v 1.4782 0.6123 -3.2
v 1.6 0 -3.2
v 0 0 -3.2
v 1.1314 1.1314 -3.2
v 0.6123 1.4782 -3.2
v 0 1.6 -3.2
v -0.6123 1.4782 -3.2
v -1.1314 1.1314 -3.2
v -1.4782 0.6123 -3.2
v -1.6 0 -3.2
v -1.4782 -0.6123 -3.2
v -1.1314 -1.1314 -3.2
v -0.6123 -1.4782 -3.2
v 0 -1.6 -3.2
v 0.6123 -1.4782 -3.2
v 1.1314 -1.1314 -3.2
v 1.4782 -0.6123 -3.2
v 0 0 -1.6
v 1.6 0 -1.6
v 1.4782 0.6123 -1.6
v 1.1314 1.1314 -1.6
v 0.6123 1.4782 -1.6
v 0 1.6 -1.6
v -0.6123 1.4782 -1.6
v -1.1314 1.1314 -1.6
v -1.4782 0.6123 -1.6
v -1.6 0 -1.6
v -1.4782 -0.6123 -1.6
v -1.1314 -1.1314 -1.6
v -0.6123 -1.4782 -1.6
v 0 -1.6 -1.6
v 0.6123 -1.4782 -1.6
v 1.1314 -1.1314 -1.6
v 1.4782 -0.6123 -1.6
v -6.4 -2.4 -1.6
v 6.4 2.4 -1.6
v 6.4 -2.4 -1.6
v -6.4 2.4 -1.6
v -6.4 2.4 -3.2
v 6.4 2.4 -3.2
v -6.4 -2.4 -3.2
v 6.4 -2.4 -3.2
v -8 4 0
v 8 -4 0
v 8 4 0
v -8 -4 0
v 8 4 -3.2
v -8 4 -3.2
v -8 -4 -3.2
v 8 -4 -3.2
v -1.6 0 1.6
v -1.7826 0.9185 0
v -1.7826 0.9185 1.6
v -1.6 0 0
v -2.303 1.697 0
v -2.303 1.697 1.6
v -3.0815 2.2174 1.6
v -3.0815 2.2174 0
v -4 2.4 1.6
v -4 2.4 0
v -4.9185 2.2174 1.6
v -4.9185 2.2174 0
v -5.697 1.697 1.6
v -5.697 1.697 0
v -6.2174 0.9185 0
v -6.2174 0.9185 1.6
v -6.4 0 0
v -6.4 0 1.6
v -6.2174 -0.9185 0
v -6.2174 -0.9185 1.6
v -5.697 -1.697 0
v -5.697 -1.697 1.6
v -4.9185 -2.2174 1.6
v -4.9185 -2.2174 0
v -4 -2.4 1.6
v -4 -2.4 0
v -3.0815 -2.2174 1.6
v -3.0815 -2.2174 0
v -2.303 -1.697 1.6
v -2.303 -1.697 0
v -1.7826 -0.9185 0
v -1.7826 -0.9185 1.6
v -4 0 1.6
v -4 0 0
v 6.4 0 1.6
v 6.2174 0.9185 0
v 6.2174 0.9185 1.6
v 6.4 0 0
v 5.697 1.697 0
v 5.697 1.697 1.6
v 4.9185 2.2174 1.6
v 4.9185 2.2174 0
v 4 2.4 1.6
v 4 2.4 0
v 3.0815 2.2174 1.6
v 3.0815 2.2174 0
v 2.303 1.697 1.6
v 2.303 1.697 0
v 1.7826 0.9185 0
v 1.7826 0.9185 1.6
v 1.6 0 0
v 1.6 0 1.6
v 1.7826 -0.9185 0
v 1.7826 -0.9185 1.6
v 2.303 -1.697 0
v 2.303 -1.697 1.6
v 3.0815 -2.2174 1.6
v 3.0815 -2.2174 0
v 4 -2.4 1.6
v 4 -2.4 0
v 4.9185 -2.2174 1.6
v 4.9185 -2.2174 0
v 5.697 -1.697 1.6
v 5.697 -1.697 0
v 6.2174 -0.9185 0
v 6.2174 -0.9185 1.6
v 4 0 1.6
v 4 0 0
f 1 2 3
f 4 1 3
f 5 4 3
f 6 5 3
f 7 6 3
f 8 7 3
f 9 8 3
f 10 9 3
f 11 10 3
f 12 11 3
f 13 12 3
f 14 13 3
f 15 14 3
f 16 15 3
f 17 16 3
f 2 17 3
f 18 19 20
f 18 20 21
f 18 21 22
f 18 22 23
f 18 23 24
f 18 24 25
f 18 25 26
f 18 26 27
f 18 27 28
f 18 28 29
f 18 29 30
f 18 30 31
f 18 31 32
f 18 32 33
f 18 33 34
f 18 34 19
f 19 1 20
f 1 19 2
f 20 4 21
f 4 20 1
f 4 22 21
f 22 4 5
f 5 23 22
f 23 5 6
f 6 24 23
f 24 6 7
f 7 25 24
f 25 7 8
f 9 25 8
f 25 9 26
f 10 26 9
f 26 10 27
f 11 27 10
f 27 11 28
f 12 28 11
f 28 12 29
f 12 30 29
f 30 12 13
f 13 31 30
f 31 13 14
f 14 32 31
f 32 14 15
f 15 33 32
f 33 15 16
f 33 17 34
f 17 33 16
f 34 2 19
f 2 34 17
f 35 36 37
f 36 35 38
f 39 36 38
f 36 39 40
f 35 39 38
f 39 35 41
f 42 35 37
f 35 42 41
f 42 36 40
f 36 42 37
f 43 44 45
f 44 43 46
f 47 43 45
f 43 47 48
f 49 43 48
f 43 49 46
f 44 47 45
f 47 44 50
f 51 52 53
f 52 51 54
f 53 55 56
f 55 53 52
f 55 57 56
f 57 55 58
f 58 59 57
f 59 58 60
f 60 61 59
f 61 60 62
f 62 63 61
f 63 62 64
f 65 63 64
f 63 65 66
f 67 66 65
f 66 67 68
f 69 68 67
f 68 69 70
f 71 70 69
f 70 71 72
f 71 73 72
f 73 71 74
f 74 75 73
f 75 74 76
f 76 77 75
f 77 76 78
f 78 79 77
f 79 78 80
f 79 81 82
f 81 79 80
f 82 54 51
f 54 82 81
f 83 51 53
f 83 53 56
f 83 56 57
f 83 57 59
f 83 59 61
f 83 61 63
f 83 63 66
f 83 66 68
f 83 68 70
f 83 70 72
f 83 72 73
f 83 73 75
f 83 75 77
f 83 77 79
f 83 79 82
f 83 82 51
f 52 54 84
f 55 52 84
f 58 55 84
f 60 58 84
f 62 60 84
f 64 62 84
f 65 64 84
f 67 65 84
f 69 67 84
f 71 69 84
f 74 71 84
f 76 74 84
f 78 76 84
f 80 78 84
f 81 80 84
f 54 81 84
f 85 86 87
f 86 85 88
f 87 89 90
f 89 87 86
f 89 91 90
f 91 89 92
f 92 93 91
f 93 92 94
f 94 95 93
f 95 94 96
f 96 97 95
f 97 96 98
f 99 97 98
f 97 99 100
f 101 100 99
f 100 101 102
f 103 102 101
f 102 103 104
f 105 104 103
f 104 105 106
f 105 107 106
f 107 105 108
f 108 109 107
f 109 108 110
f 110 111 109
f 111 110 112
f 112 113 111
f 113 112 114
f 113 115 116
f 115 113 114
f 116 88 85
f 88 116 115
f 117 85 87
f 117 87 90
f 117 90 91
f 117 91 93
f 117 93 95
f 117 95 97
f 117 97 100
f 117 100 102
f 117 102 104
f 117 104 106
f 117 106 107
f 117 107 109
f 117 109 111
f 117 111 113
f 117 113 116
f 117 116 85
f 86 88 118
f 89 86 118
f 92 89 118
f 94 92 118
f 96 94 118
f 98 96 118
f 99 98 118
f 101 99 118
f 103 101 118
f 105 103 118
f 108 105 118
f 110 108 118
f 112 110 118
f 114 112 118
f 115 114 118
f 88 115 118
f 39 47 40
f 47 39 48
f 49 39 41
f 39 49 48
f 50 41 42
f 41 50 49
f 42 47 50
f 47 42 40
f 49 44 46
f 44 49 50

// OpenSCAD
// file: ../p/stud.scad
use <../lib.scad>
use <4-4cyli.scad>
use <4-4disc.scad>
use <4-4edge.scad>
function ldraw_lib__stud() = [
// 0 Stud
// 0 Name: stud.dat
// 0 Author: James Jessiman
// 0 !LDRAW_ORG Primitive UPDATE 2012-01
// 0 !LICENSE Licensed under CC BY 4.0 : see CAreadme.txt
// 
// 0 BFC CERTIFY CCW
  [0,"BFC","CERTIFY"],
  [0,"BFC","CCW"],
// 
// 0 !HISTORY 2002-04-04 [sbliss] Modified for BFC compliance
// 0 !HISTORY 2002-04-25 [PTadmin] Official Update 2002-02
// 0 !HISTORY 2007-06-24 [PTadmin] Header formatted for Contributor Agreement
// 0 !HISTORY 2008-07-01 [PTadmin] Official Update 2008-01
// 0 !HISTORY 2012-02-16 [Philo] Changed to CCW
// 0 !HISTORY 2012-03-30 [PTadmin] Official Update 2012-01
// 
// 
// 1 16 0 0 0 6 0 0 0 1 0 0 0 6 4-4edge.dat
  [1,16,0,0,0,6,0,0,0,1,0,0,0,6, ldraw_lib__4_4edge()],
// 1 16 0 -4 0 6 0 0 0 1 0 0 0 6 4-4edge.dat
  [1,16,0,-4,0,6,0,0,0,1,0,0,0,6, ldraw_lib__4_4edge()],
// 1 16 0 0 0 6 0 0 0 -4 0 0 0 6 4-4cyli.dat
  [1,16,0,0,0,6,0,0,0,-4,0,0,0,6, ldraw_lib__4_4cyli()],
// 1 16 0 -4 0 6 0 0 0 1 0 0 0 6 4-4disc.dat
  [1,16,0,-4,0,6,0,0,0,1,0,0,0,6, ldraw_lib__4_4disc()],
  [-1,16,0,0,0,6,0,0,0,-1,0,0,0,6, ldraw_lib__4_4disc()],
];
module ldraw_lib__stud(step=0, col=false, unit=2/5, alt=false, line=0.2, solid=!$preview)
    makepoly(ldraw_lib__stud(), step=step, col=col, unit=unit, alt=alt, line=line, solid=solid);
ldraw_lib__stud(line=0.2);
// file: ../p/4-4edge.scad
use <../lib.scad>
function ldraw_lib__4_4edge() = [
// 0 Circle 1.0
// 0 Name: 4-4edge.dat
// 0 Author: James Jessiman
// 0 !LDRAW_ORG Primitive UPDATE 2017-01
// 0 !LICENSE Licensed under CC BY 2.0 and CC BY 4.0 : see CAreadme.txt
// 
// 0 BFC CERTIFY CCW
  [0,"BFC","CERTIFY"],
  [0,"BFC","CCW"],
// 
// 0 !HISTORY 1998-12-15 [PTadmin] Official Update 1998-10
// 0 !HISTORY 2005-12-28 [PTadmin] Official Update 2005-01
// 0 !HISTORY 2007-06-24 [PTadmin] Header formatted for Contributor Agreement
// 0 !HISTORY 2008-07-01 [PTadmin] Official Update 2008-01
// 0 !HISTORY 2017-01-15 [Steffen] BFCed
// 0 !HISTORY 2017-12-30 [PTadmin] Official Update 2017-01
// 
// 
// 2 24 1 0 0 0.9239 0 0.3827
  [2,24,1,0,0,0.9239,0,0.3827],
// 2 24 0.9239 0 0.3827 0.7071 0 0.7071
  [2,24,0.9239,0,0.3827,0.7071,0,0.7071],
// 2 24 0.7071 0 0.7071 0.3827 0 0.9239
  [2,24,0.7071,0,0.7071,0.3827,0,0.9239],
// 2 24 0.3827 0 0.9239 0 0 1
  [2,24,0.3827,0,0.9239,0,0,1],
// 2 24 0 0 1 -0.3827 0 0.9239
  [2,24,0,0,1,-0.3827,0,0.9239],
// 2 24 -0.3827 0 0.9239 -0.7071 0 0.7071
  [2,24,-0.3827,0,0.9239,-0.7071,0,0.7071],
// 2 24 -0.7071 0 0.7071 -0.9239 0 0.3827
  [2,24,-0.7071,0,0.7071,-0.9239,0,0.3827],
// 2 24 -0.9239 0 0.3827 -1 0 -0
  [2,24,-0.9239,0,0.3827,-1,0,-0],
// 2 24 -1 0 -0 -0.9239 0 -0.3827
  [2,24,-1,0,-0,-0.9239,0,-0.3827],
// 2 24 -0.9239 0 -0.3827 -0.7071 0 -0.7071
  [2,24,-0.9239,0,-0.3827,-0.7071,0,-0.7071],
// 2 24 -0.7071 0 -0.7071 -0.3827 0 -0.9239
  [2,24,-0.7071,0,-0.7071,-0.3827,0,-0.9239],
// 2 24 -0.3827 0 -0.9239 0 0 -1
  [2,24,-0.3827,0,-0.9239,0,0,-1],
// 2 24 0 0 -1 0.3827 0 -0.9239
  [2,24,0,0,-1,0.3827,0,-0.9239],
// 2 24 0.3827 0 -0.9239 0.7071 0 -0.7071
  [2,24,0.3827,0,-0.9239,0.7071,0,-0.7071],
// 2 24 0.7071 0 -0.7071 0.9239 0 -0.3827
  [2,24,0.7071,0,-0.7071,0.9239,0,-0.3827],
// 2 24 0.9239 0 -0.3827 1 0 0
  [2,24,0.9239,0,-0.3827,1,0,0],
];
module ldraw_lib__4_4edge(step=0, col=false, unit=2/5, alt=false, line=0.2, solid=!$preview)
    makepoly(ldraw_lib__4_4edge(), step=step, col=col, unit=unit, alt=alt, line=line, solid=solid);
ldraw_lib__4_4edge(line=0.2);
// file: ../p/4-4disc.scad
use <../lib.scad>
function ldraw_lib__4_4disc() = [
// 0 Disc 1.0
// 0 Name: 4-4disc.dat
// 0 Author: James Jessiman
// 0 !LDRAW_ORG Primitive UPDATE 2002-02
// 0 !LICENSE Licensed under CC BY 2.0 and CC BY 4.0 : see CAreadme.txt
// 
// 0 BFC CERTIFY CCW
  [0,"BFC","CERTIFY"],
  [0,"BFC","CCW"],
// 
// 0 !HISTORY 1998-12-15 [PTadmin] Official Update 1998-10
// 0 !HISTORY 2002-03-23 [sbliss] Added BFC statement
// 0 !HISTORY 2002-04-25 [PTadmin] Official Update 2002-02
// 0 !HISTORY 2007-06-24 [PTadmin] Header formatted for Contributor Agreement
// 0 !HISTORY 2008-07-01 [PTadmin] Official Update 2008-01
// 
// 
// 3 16 0 0 0 1 0 0 0.9239 0 0.3827
  [3,16,0,0,0,1,0,0,0.9239,0,0.3827],
// 3 16 0 0 0 0.9239 0 0.3827 0.7071 0 0.7071
  [3,16,0,0,0,0.9239,0,0.3827,0.7071,0,0.7071],
// 3 16 0 0 0 0.7071 0 0.7071 0.3827 0 0.9239
  [3,16,0,0,0,0.7071,0,0.7071,0.3827,0,0.9239],
// 3 16 0 0 0 0.3827 0 0.9239 0 0 1
  [3,16,0,0,0,0.3827,0,0.9239,0,0,1],
// 3 16 0 0 0 0 0 1 -0.3827 0 0.9239
  [3,16,0,0,0,0,0,1,-0.3827,0,0.9239],
// 3 16 0 0 0 -0.3827 0 0.9239 -0.7071 0 0.7071
  [3,16,0,0,0,-0.3827,0,0.9239,-0.7071,0,0.7071],
// 3 16 0 0 0 -0.7071 0 0.7071 -0.9239 0 0.3827
  [3,16,0,0,0,-0.7071,0,0.7071,-0.9239,0,0.3827],
// 3 16 0 0 0 -0.9239 0 0.3827 -1 0 -0
  [3,16,0,0,0,-0.9239,0,0.3827,-1,0,-0],
// 3 16 0 0 0 -1 0 -0 -0.9239 0 -0.3827
  [3,16,0,0,0,-1,0,-0,-0.9239,0,-0.3827],
// 3 16 0 0 0 -0.9239 0 -0.3827 -0.7071 0 -0.7071
  [3,16,0,0,0,-0.9239,0,-0.3827,-0.7071,0,-0.7071],
// 3 16 0 0 0 -0.7071 0 -0.7071 -0.3827 0 -0.9239
  [3,16,0,0,0,-0.7071,0,-0.7071,-0.3827,0,-0.9239],
// 3 16 0 0 0 -0.3827 0 -0.9239 0 0 -1
  [3,16,0,0,0,-0.3827,0,-0.9239,0,0,-1],
// 3 16 0 0 0 0 0 -1 0.3827 0 -0.9239
  [3,16,0,0,0,0,0,-1,0.3827,0,-0.9239],
// 3 16 0 0 0 0.3827 0 -0.9239 0.7071 0 -0.7071
  [3,16,0,0,0,0.3827,0,-0.9239,0.7071,0,-0.7071],
// 3 16 0 0 0 0.7071 0 -0.7071 0.9239 0 -0.3827
  [3,16,0,0,0,0.7071,0,-0.7071,0.9239,0,-0.3827],
// 3 16 0 0 0 0.9239 0 -0.3827 1 0 0
  [3,16,0,0,0,0.9239,0,-0.3827,1,0,0],
// 0
];
module ldraw_lib__4_4disc(step=0, col=false, unit=2/5, alt=false, line=0.2, solid=!$preview)
    makepoly(ldraw_lib__4_4disc(), step=step, col=col, unit=unit, alt=alt, line=line, solid=solid);
ldraw_lib__4_4disc(line=0.2);
// file: ../p/4-4cyli.scad
use <../lib.scad>
$fa=1; $fs=0.2;
function ldraw_lib__4_4cyli(realsolid=false) = [
// 0 Cylinder 1.0
// 0 Name: 4-4cyli.dat
// 0 Author: James Jessiman
// 0 !LDRAW_ORG Primitive UPDATE 2005-01
// 0 !LICENSE Licensed under CC BY 2.0 and CC BY 4.0 : see CAreadme.txt
// 
// 0 BFC CERTIFY CCW
  [0,"BFC","CERTIFY"],
  [0,"BFC","CCW"],
// 
// 0 !HISTORY 1998-12-15 [PTadmin] Official Update 1998-10
// 0 !HISTORY 2002-03-23 [sbliss] Added BFC statement; merged headers from files in distributions LDraw 0.27 and Complete.
// 0 !HISTORY 2002-04-25 [PTadmin] Official Update 2002-02
// 0 !HISTORY 2004-12-14 [guyvivan] BFC CCW
// 0 !HISTORY 2005-12-28 [PTadmin] Official Update 2005-01
// 0 !HISTORY 2007-06-24 [PTadmin] Header formatted for Contributor Agreement
// 0 !HISTORY 2008-07-01 [PTadmin] Official Update 2008-01
// 
// 
// 4 16 1 1 0 0.9239 1 0.3827 0.9239 0 0.3827 1 0 0
  [4,16,1,1,0,0.9239,1,0.3827,0.9239,0,0.3827,1,0,0],
// 5 24 1 0 0 1 1 0 0.9239 0 0.3827 0.9239 0 -0.3827
  [5,24,1,0,0,1,1,0,0.9239,0,0.3827,0.9239,0,-0.3827],
// 4 16 0.9239 1 0.3827 0.7071 1 0.7071 0.7071 0 0.7071 0.9239 0 0.3827
  [4,16,0.9239,1,0.3827,0.7071,1,0.7071,0.7071,0,0.7071,0.9239,0,0.3827],
// 5 24 0.9239 0 0.3827 0.9239 1 0.3827 0.7071 0 0.7071 1 0 0
  [5,24,0.9239,0,0.3827,0.9239,1,0.3827,0.7071,0,0.7071,1,0,0],
// 4 16 0.7071 1 0.7071 0.3827 1 0.9239 0.3827 0 0.9239 0.7071 0 0.7071
  [4,16,0.7071,1,0.7071,0.3827,1,0.9239,0.3827,0,0.9239,0.7071,0,0.7071],
// 5 24 0.7071 0 0.7071 0.7071 1 0.7071 0.3827 0 0.9239 0.9239 0 0.3827
  [5,24,0.7071,0,0.7071,0.7071,1,0.7071,0.3827,0,0.9239,0.9239,0,0.3827],
// 4 16 0.3827 1 0.9239 0 1 1 0 0 1 0.3827 0 0.9239
  [4,16,0.3827,1,0.9239,0,1,1,0,0,1,0.3827,0,0.9239],
// 5 24 0.3827 0 0.9239 0.3827 1 0.9239 0 0 1 0.7071 0 0.7071
  [5,24,0.3827,0,0.9239,0.3827,1,0.9239,0,0,1,0.7071,0,0.7071],
// 4 16 0 1 1 -0.3827 1 0.9239 -0.3827 0 0.9239 0 0 1
  [4,16,0,1,1,-0.3827,1,0.9239,-0.3827,0,0.9239,0,0,1],
// 5 24 0 0 1 0 1 1 -0.3827 0 0.9239 0.3827 0 0.9239
  [5,24,0,0,1,0,1,1,-0.3827,0,0.9239,0.3827,0,0.9239],
// 4 16 -0.3827 1 0.9239 -0.7071 1 0.7071 -0.7071 0 0.7071 -0.3827 0 0.9239
  [4,16,-0.3827,1,0.9239,-0.7071,1,0.7071,-0.7071,0,0.7071,-0.3827,0,0.9239],
// 5 24 -0.3827 0 0.9239 -0.3827 1 0.9239 -0.7071 0 0.7071 0 0 1
  [5,24,-0.3827,0,0.9239,-0.3827,1,0.9239,-0.7071,0,0.7071,0,0,1],
// 4 16 -0.7071 1 0.7071 -0.9239 1 0.3827 -0.9239 0 0.3827 -0.7071 0 0.7071
  [4,16,-0.7071,1,0.7071,-0.9239,1,0.3827,-0.9239,0,0.3827,-0.7071,0,0.7071],
// 5 24 -0.7071 0 0.7071 -0.7071 1 0.7071 -0.9239 0 0.3827 -0.3827 0 0.9239
  [5,24,-0.7071,0,0.7071,-0.7071,1,0.7071,-0.9239,0,0.3827,-0.3827,0,0.9239],
// 4 16 -0.9239 1 0.3827 -1 1 0 -1 0 0 -0.9239 0 0.3827
  [4,16,-0.9239,1,0.3827,-1,1,0,-1,0,0,-0.9239,0,0.3827],
// 5 24 -0.9239 0 0.3827 -0.9239 1 0.3827 -1 0 0 -0.7071 0 0.7071
  [5,24,-0.9239,0,0.3827,-0.9239,1,0.3827,-1,0,0,-0.7071,0,0.7071],
// 4 16 -1 1 0 -0.9239 1 -0.3827 -0.9239 0 -0.3827 -1 0 0
  [4,16,-1,1,0,-0.9239,1,-0.3827,-0.9239,0,-0.3827,-1,0,0],
// 5 24 -1 0 0 -1 1 0 -0.9239 0 -0.3827 -0.9239 0 0.3827
  [5,24,-1,0,0,-1,1,0,-0.9239,0,-0.3827,-0.9239,0,0.3827],
// 4 16 -0.9239 1 -0.3827 -0.7071 1 -0.7071 -0.7071 0 -0.7071 -0.9239 0 -0.3827
  [4,16,-0.9239,1,-0.3827,-0.7071,1,-0.7071,-0.7071,0,-0.7071,-0.9239,0,-0.3827],
// 5 24 -0.9239 0 -0.3827 -0.9239 1 -0.3827 -0.7071 0 -0.7071 -1 0 0
  [5,24,-0.9239,0,-0.3827,-0.9239,1,-0.3827,-0.7071,0,-0.7071,-1,0,0],
// 4 16 -0.7071 1 -0.7071 -0.3827 1 -0.9239 -0.3827 0 -0.9239 -0.7071 0 -0.7071
  [4,16,-0.7071,1,-0.7071,-0.3827,1,-0.9239,-0.3827,0,-0.9239,-0.7071,0,-0.7071],
// 5 24 -0.7071 0 -0.7071 -0.7071 1 -0.7071 -0.3827 0 -0.9239 -0.9239 0 -0.3827
  [5,24,-0.7071,0,-0.7071,-0.7071,1,-0.7071,-0.3827,0,-0.9239,-0.9239,0,-0.3827],
// 4 16 -0.3827 1 -0.9239 0 1 -1 0 0 -1 -0.3827 0 -0.9239
  [4,16,-0.3827,1,-0.9239,0,1,-1,0,0,-1,-0.3827,0,-0.9239],
// 5 24 -0.3827 0 -0.9239 -0.3827 1 -0.9239 0 0 -1 -0.7071 0 -0.7071
  [5,24,-0.3827,0,-0.9239,-0.3827,1,-0.9239,0,0,-1,-0.7071,0,-0.7071],
// 4 16 0 1 -1 0.3827 1 -0.9239 0.3827 0 -0.9239 0 0 -1
  [4,16,0,1,-1,0.3827,1,-0.9239,0.3827,0,-0.9239,0,0,-1],
// 5 24 0 0 -1 0 1 -1 0.3827 0 -0.9239 -0.3827 0 -0.9239
  [5,24,0,0,-1,0,1,-1,0.3827,0,-0.9239,-0.3827,0,-0.9239],
// 4 16 0.3827 1 -0.9239 0.7071 1 -0.7071 0.7071 0 -0.7071 0.3827 0 -0.9239
  [4,16,0.3827,1,-0.9239,0.7071,1,-0.7071,0.7071,0,-0.7071,0.3827,0,-0.9239],
// 5 24 0.3827 0 -0.9239 0.3827 1 -0.9239 0.7071 0 -0.7071 0 0 -1
  [5,24,0.3827,0,-0.9239,0.3827,1,-0.9239,0.7071,0,-0.7071,0,0,-1],
// 4 16 0.7071 1 -0.7071 0.9239 1 -0.3827 0.9239 0 -0.3827 0.7071 0 -0.7071
  [4,16,0.7071,1,-0.7071,0.9239,1,-0.3827,0.9239,0,-0.3827,0.7071,0,-0.7071],
// 5 24 0.7071 0 -0.7071 0.7071 1 -0.7071 0.9239 0 -0.3827 0.3827 0 -0.9239
  [5,24,0.7071,0,-0.7071,0.7071,1,-0.7071,0.9239,0,-0.3827,0.3827,0,-0.9239],
// 4 16 0.9239 1 -0.3827 1 1 0 1 0 0 0.9239 0 -0.3827
  [4,16,0.9239,1,-0.3827,1,1,0,1,0,0,0.9239,0,-0.3827],
// 5 24 0.9239 0 -0.3827 0.9239 1 -0.3827 1 0 0 0.7071 0 -0.7071
  [5,24,0.9239,0,-0.3827,0.9239,1,-0.3827,1,0,0,0.7071,0,-0.7071],
// 0
];
module ldraw_lib__4_4cyli(step=0, col=false, unit=2/5, alt=false, line=0.2, solid=!$preview)
    makepoly(ldraw_lib__4_4cyli(solid), step=step, col=col, unit=unit, alt=alt, line=line, solid=solid);
ldraw_lib__4_4cyli(line=0.2);
// file: ../p/stug-1x2.scad
use <../lib.scad>
use <stud.scad>
$fa=1; $fs=0.2;
function ldraw_lib__stug_1x2(realsolid=false) = [
// 0 Stud Group  1 x  2
// 0 Name: stug-1x2.dat
// 0 Author: Steffen [Steffen]
// 0 !LDRAW_ORG Primitive UPDATE 2011-01
// 0 !LICENSE Licensed under CC BY 2.0 and CC BY 4.0 : see CAreadme.txt
// 
// 0 BFC CERTIFY CCW
  [0,"BFC","CERTIFY"],
  [0,"BFC","CCW"],
// 
// 0 !HISTORY 2011-07-25 [PTadmin] Official Update 2011-01
// 
// 
// 1 16 -10 0 0 1 0 0 0 1 0 0 0 1 stud.dat
  [1,16,-10,0,0,1,0,0,0,1,0,0,0,1, ldraw_lib__stud(realsolid)],
// 1 16 10 0 0 1 0 0 0 1 0 0 0 1 stud.dat
  [1,16,10,0,0,1,0,0,0,1,0,0,0,1, ldraw_lib__stud(realsolid)],
];
module ldraw_lib__stug_1x2(step=0, col=false, unit=2/5, alt=false, line=0.2, solid=!$preview)
    makepoly(ldraw_lib__stug_1x2(solid), step=step, col=col, unit=unit, alt=alt, line=line, solid=solid);
ldraw_lib__stug_1x2(line=0.2);
// file: ../p/stud3.scad
use <../lib.scad>
use <4-4cyli.scad>
use <4-4disc.scad>
use <4-4edge.scad>
function ldraw_lib__stud3() = [
// 0 Stud Tube Solid
// 0 Name: stud3.dat
// 0 Author: James Jessiman
// 0 !LDRAW_ORG Primitive UPDATE 2012-01
// 0 !LICENSE Licensed under CC BY 4.0 : see CAreadme.txt
// 
// 0 BFC CERTIFY CCW
  [0,"BFC","CERTIFY"],
  [0,"BFC","CCW"],
// 
// 0 !HISTORY 2002-04-04 [sbliss] Modified for BFC compliance
// 0 !HISTORY 2002-04-25 [PTadmin] Official Update 2002-02
// 0 !HISTORY 2007-06-24 [PTadmin] Header formatted for Contributor Agreement
// 0 !HISTORY 2008-07-01 [PTadmin] Official Update 2008-01
// 0 !HISTORY 2012-02-16 [Philo] Changed to CCW
// 0 !HISTORY 2012-03-30 [PTadmin] Official Update 2012-01
// 
// 
// 1 16 0 -4 0 4 0 0 0 1 0 0 0 4 4-4edge.dat
  [1,16,0,-4,0,4,0,0,0,1,0,0,0,4, ldraw_lib__4_4edge()],
// 1 16 0 0 0 4 0 0 0 1 0 0 0 4 4-4edge.dat
  [1,16,0,0,0,4,0,0,0,1,0,0,0,4, ldraw_lib__4_4edge()],
// 1 16 0 -4 0 4 0 0 0 1 0 0 0 4 4-4disc.dat
  [1,16,0,-4,0,4,0,0,0,1,0,0,0,4, ldraw_lib__4_4disc()],
  [-1,16,0,0,0,4,0,0,0,-1,0,0,0,4, ldraw_lib__4_4disc()],
// 1 16 0 -4 0 4 0 0 0 4 0 0 0 4 4-4cyli.dat
  [1,16,0,-4,0,4,0,0,0,4,0,0,0,4, ldraw_lib__4_4cyli()],
];
module ldraw_lib__stud3(step=0, col=false, unit=2/5, alt=false, line=0.2, solid=!$preview)
    makepoly(ldraw_lib__stud3(), step=step, col=col, unit=unit, alt=alt, line=line, solid=solid);
ldraw_lib__stud3(line=0.2);
// file: ../p/box5.scad
use <../lib.scad>
function ldraw_lib__box5() = [
// 0 Box with 5 Faces and All Edges
// 0 Name: box5.dat
// 0 Author: James Jessiman
// 0 !LDRAW_ORG Primitive UPDATE 2012-01
// 0 !LICENSE Licensed under CC BY 2.0 and CC BY 4.0 : see CAreadme.txt
// 
// 0 BFC CERTIFY CCW
  [0,"BFC","CERTIFY"],
  [0,"BFC","CCW"],
// 
// 0 !HISTORY 2002-04-03 [sbliss] Modified for BFC compliance
// 0 !HISTORY 2002-04-25 [PTadmin] Official Update 2002-02
// 0 !HISTORY 2007-06-24 [PTadmin] Header formatted for Contributor Agreement
// 0 !HISTORY 2008-07-01 [PTadmin] Official Update 2008-01
// 0 !HISTORY 2012-02-16 [Philo] Changed to CCW
// 0 !HISTORY 2012-03-30 [PTadmin] Official Update 2012-01
// 
// 
// 2 24 1 1 1 -1 1 1
  [2,24,1,1,1,-1,1,1],
// 2 24 -1 1 1 -1 1 -1
  [2,24,-1,1,1,-1,1,-1],
// 2 24 -1 1 -1 1 1 -1
  [2,24,-1,1,-1,1,1,-1],
// 2 24 1 1 -1 1 1 1
  [2,24,1,1,-1,1,1,1],
// 2 24 1 0 1 -1 0 1
  [2,24,1,0,1,-1,0,1],
// 2 24 -1 0 1 -1 0 -1
  [2,24,-1,0,1,-1,0,-1],
// 2 24 -1 0 -1 1 0 -1
  [2,24,-1,0,-1,1,0,-1],
// 2 24 1 0 -1 1 0 1
  [2,24,1,0,-1,1,0,1],
// 2 24 1 0 1 1 1 1
  [2,24,1,0,1,1,1,1],
// 2 24 -1 0 1 -1 1 1
  [2,24,-1,0,1,-1,1,1],
// 2 24 1 0 -1 1 1 -1
  [2,24,1,0,-1,1,1,-1],
// 2 24 -1 0 -1 -1 1 -1
  [2,24,-1,0,-1,-1,1,-1],
// 4 16 -1 1 1 1 1 1 1 1 -1 -1 1 -1
  [4,16,-1,1,1,1,1,1,1,1,-1,-1,1,-1],
// 4 16 -1 1 1 -1 0 1 1 0 1 1 1 1
  [4,16,-1,1,1,-1,0,1,1,0,1,1,1,1],
// 4 16 -1 1 -1 -1 0 -1 -1 0 1 -1 1 1
  [4,16,-1,1,-1,-1,0,-1,-1,0,1,-1,1,1],
// 4 16 1 1 -1 1 0 -1 -1 0 -1 -1 1 -1
  [4,16,1,1,-1,1,0,-1,-1,0,-1,-1,1,-1],
// 4 16 1 1 1 1 0 1 1 0 -1 1 1 -1
  [4,16,1,1,1,1,0,1,1,0,-1,1,1,-1],
];
makepoly(ldraw_lib__box5(), line=0.2);
// file: ../p/box4t.scad
use <../lib.scad>
function ldraw_lib__box4t() = [
// 0 Box with 4 Adjacent Faces and All Edges
// 0 Name: box4t.dat
// 0 Author: Tore Eriksson [Tore_Eriksson]
// 0 !LDRAW_ORG Primitive UPDATE 2003-02
// 0 !LICENSE Licensed under CC BY 2.0 and CC BY 4.0 : see CAreadme.txt
// 
// 0 BFC CERTIFY CCW
  [0,"BFC","CERTIFY"],
  [0,"BFC","CCW"],
// 
// 0 !HISTORY 1997-09-29 [PTadmin] Official Update 1997-15
// 0 !HISTORY 2002-08-31 [izanette] Modified with WINDZ for BFC compliance
// 0 !HISTORY 2003-08-01 [PTadmin] Official Update 2003-02
// 0 !HISTORY 2007-06-24 [PTadmin] Header formatted for Contributor Agreement
// 0 !HISTORY 2008-07-01 [PTadmin] Official Update 2008-01
// 
// 
// 2 24 1 1 1 -1 1 1
  [2,24,1,1,1,-1,1,1],
// 2 24 -1 1 1 -1 1 -1
  [2,24,-1,1,1,-1,1,-1],
// 2 24 -1 1 -1 1 1 -1
  [2,24,-1,1,-1,1,1,-1],
// 2 24 1 1 -1 1 1 1
  [2,24,1,1,-1,1,1,1],
// 2 24 1 0 1 -1 0 1
  [2,24,1,0,1,-1,0,1],
// 2 24 -1 0 1 -1 0 -1
  [2,24,-1,0,1,-1,0,-1],
// 2 24 -1 0 -1 1 0 -1
  [2,24,-1,0,-1,1,0,-1],
// 2 24 1 0 -1 1 0 1
  [2,24,1,0,-1,1,0,1],
// 2 24 1 0 1 1 1 1
  [2,24,1,0,1,1,1,1],
// 2 24 -1 0 1 -1 1 1
  [2,24,-1,0,1,-1,1,1],
// 2 24 1 0 -1 1 1 -1
  [2,24,1,0,-1,1,1,-1],
// 2 24 -1 0 -1 -1 1 -1
  [2,24,-1,0,-1,-1,1,-1],
// 4 16 1 1 1 1 1 -1 -1 1 -1 -1 1 1
  [4,16,1,1,1,1,1,-1,-1,1,-1,-1,1,1],
// 4 16 1 1 1 -1 1 1 -1 0 1 1 0 1
  [4,16,1,1,1,-1,1,1,-1,0,1,1,0,1],
// 4 16 -1 1 1 -1 1 -1 -1 0 -1 -1 0 1
  [4,16,-1,1,1,-1,1,-1,-1,0,-1,-1,0,1],
// 0 4 16 -1 1 -1 -1 0 -1 1 0 -1 1 1 -1
// 4 16 1 1 -1 1 1 1 1 0 1 1 0 -1
  [4,16,1,1,-1,1,1,1,1,0,1,1,0,-1],
// 0
];
makepoly(ldraw_lib__box4t(), line=0.2);
// file: s/3023bs01.scad
use <../../lib.scad>
use <../../p/box4t.scad>
use <../../p/box5.scad>
use <../../p/stud3.scad>
use <../../p/stug-1x2.scad>
function ldraw_lib__s__3023bs01() = [
// 0 ~Plate  1 x  2 without Front Face
// 0 Name: s\3023bs01.dat
// 0 Author: Massimo Maso [Sirio]
// 0 !LDRAW_ORG Subpart UPDATE 2023-03
// 0 !LICENSE Licensed under CC BY 4.0 : see CAreadme.txt
// 
// 0 BFC CERTIFY CCW
  [0,"BFC","CERTIFY"],
  [0,"BFC","CCW"],
// 
// 0 !HISTORY 2022-01-14 [PTadmin] Official Update 2022-01
// 0 !HISTORY 2023-05-27 [OrionP] Moved from s\3023s01.dat
// 0 !HISTORY 2023-06-24 [OrionP] Official Update 2023-03
// 
// 
// 0 // Primitves
// 1 16 0 4 0 1 0 0 0 -1 0 0 0 1 stud3.dat
  [1,16,0,4,0,1,0,0,0,-1,0,0,0,1, ldraw_lib__stud3()],
// 0 BFC INVERTNEXT
  [0,"BFC","INVERTNEXT"],
// 1 16 0 8 0 16 0 0 0 -4 0 0 0 6 box5.dat
  [1,16,0,8,0,16,0,0,0,-4,0,0,0,6, ldraw_lib__box5()],
// 1 16 0 8 0 20 0 0 0 -8 0 0 0 10 box4t.dat
  [1,16,0,8,0,20,0,0,0,-8,0,0,0,10, ldraw_lib__box4t()],
// 1 16 0 0 0 1 0 0 0 1 0 0 0 1 stug-1x2.dat
  [1,16,0,0,0,1,0,0,0,1,0,0,0,1, ldraw_lib__stug_1x2()],
// 0 // Faces
// 4 16 20 8 10 16 8 6 -16 8 6 -20 8 10
  [4,16,20,8,10,16,8,6,-16,8,6,-20,8,10],
// 4 16 -20 8 10 -16 8 6 -16 8 -6 -20 8 -10
  [4,16,-20,8,10,-16,8,6,-16,8,-6,-20,8,-10],
// 4 16 -20 8 -10 -16 8 -6 16 8 -6 20 8 -10
  [4,16,-20,8,-10,-16,8,-6,16,8,-6,20,8,-10],
// 4 16 20 8 -10 16 8 -6 16 8 6 20 8 10
  [4,16,20,8,-10,16,8,-6,16,8,6,20,8,10],
];
module ldraw_lib__s__3023bs01(step=0, col=false, unit=2/5, alt=false, line=0.2, solid=!$preview)
    makepoly(ldraw_lib__s__3023bs01(), step=step, col=col, unit=unit, alt=alt, line=line, solid=solid);
ldraw_lib__s__3023bs01(line=0.2);
// main file
use <../lib.scad>
use <s/3023bs01.scad>
function ldraw_lib__3023b() = [
// 0 Plate  1 x  2
// 0 Name: 3023b.dat
// 0 Author: James Jessiman
// 0 !LDRAW_ORG Part UPDATE 2023-03
// 0 !LICENSE Licensed under CC BY 4.0 : see CAreadme.txt
// 
// 0 BFC CERTIFY CCW
  [0,"BFC","CERTIFY"],
  [0,"BFC","CCW"],
// 
// 0 !KEYWORDS BrickLink 3023, Rebrickable 3023
// 
// 0 !HISTORY 2001-10-26 [PTadmin] Official Update 2001-01
// 0 !HISTORY 2002-05-07 {unknown} BFC Certification
// 0 !HISTORY 2002-06-11 [PTadmin] Official Update 2002-03
// 0 !HISTORY 2007-06-07 [PTadmin] Header formatted for Contributor Agreement
// 0 !HISTORY 2008-07-01 [PTadmin] Official Update 2008-01
// 0 !HISTORY 2020-03-07 [Sirio] Subparted
// 0 !HISTORY 2022-01-14 [PTadmin] Official Update 2022-01
// 0 !HISTORY 2023-05-26 [OrionP] Moved from 3023.dat
// 0 !HISTORY 2023-06-24 [OrionP] Official Update 2023-03
// 
// 
// 1 16 0 0 0 1 0 0 0 1 0 0 0 1 s\3023bs01.dat
  [1,16,0,0,0,1,0,0,0,1,0,0,0,1, ldraw_lib__s__3023bs01()],
// 4 16 -20 0 -10 -20 8 -10 20 8 -10 20 0 -10
  [4,16,-20,0,-10,-20,8,-10,20,8,-10,20,0,-10],
];
module ldraw_lib__3023b(step=0, col=false, unit=2/5, alt=false, line=0.2, solid=!$preview)
    makepoly(ldraw_lib__3023b(), step=step, col=col, unit=unit, alt=alt, line=line, solid=solid);
ldraw_lib__3023b(line=0.2);
